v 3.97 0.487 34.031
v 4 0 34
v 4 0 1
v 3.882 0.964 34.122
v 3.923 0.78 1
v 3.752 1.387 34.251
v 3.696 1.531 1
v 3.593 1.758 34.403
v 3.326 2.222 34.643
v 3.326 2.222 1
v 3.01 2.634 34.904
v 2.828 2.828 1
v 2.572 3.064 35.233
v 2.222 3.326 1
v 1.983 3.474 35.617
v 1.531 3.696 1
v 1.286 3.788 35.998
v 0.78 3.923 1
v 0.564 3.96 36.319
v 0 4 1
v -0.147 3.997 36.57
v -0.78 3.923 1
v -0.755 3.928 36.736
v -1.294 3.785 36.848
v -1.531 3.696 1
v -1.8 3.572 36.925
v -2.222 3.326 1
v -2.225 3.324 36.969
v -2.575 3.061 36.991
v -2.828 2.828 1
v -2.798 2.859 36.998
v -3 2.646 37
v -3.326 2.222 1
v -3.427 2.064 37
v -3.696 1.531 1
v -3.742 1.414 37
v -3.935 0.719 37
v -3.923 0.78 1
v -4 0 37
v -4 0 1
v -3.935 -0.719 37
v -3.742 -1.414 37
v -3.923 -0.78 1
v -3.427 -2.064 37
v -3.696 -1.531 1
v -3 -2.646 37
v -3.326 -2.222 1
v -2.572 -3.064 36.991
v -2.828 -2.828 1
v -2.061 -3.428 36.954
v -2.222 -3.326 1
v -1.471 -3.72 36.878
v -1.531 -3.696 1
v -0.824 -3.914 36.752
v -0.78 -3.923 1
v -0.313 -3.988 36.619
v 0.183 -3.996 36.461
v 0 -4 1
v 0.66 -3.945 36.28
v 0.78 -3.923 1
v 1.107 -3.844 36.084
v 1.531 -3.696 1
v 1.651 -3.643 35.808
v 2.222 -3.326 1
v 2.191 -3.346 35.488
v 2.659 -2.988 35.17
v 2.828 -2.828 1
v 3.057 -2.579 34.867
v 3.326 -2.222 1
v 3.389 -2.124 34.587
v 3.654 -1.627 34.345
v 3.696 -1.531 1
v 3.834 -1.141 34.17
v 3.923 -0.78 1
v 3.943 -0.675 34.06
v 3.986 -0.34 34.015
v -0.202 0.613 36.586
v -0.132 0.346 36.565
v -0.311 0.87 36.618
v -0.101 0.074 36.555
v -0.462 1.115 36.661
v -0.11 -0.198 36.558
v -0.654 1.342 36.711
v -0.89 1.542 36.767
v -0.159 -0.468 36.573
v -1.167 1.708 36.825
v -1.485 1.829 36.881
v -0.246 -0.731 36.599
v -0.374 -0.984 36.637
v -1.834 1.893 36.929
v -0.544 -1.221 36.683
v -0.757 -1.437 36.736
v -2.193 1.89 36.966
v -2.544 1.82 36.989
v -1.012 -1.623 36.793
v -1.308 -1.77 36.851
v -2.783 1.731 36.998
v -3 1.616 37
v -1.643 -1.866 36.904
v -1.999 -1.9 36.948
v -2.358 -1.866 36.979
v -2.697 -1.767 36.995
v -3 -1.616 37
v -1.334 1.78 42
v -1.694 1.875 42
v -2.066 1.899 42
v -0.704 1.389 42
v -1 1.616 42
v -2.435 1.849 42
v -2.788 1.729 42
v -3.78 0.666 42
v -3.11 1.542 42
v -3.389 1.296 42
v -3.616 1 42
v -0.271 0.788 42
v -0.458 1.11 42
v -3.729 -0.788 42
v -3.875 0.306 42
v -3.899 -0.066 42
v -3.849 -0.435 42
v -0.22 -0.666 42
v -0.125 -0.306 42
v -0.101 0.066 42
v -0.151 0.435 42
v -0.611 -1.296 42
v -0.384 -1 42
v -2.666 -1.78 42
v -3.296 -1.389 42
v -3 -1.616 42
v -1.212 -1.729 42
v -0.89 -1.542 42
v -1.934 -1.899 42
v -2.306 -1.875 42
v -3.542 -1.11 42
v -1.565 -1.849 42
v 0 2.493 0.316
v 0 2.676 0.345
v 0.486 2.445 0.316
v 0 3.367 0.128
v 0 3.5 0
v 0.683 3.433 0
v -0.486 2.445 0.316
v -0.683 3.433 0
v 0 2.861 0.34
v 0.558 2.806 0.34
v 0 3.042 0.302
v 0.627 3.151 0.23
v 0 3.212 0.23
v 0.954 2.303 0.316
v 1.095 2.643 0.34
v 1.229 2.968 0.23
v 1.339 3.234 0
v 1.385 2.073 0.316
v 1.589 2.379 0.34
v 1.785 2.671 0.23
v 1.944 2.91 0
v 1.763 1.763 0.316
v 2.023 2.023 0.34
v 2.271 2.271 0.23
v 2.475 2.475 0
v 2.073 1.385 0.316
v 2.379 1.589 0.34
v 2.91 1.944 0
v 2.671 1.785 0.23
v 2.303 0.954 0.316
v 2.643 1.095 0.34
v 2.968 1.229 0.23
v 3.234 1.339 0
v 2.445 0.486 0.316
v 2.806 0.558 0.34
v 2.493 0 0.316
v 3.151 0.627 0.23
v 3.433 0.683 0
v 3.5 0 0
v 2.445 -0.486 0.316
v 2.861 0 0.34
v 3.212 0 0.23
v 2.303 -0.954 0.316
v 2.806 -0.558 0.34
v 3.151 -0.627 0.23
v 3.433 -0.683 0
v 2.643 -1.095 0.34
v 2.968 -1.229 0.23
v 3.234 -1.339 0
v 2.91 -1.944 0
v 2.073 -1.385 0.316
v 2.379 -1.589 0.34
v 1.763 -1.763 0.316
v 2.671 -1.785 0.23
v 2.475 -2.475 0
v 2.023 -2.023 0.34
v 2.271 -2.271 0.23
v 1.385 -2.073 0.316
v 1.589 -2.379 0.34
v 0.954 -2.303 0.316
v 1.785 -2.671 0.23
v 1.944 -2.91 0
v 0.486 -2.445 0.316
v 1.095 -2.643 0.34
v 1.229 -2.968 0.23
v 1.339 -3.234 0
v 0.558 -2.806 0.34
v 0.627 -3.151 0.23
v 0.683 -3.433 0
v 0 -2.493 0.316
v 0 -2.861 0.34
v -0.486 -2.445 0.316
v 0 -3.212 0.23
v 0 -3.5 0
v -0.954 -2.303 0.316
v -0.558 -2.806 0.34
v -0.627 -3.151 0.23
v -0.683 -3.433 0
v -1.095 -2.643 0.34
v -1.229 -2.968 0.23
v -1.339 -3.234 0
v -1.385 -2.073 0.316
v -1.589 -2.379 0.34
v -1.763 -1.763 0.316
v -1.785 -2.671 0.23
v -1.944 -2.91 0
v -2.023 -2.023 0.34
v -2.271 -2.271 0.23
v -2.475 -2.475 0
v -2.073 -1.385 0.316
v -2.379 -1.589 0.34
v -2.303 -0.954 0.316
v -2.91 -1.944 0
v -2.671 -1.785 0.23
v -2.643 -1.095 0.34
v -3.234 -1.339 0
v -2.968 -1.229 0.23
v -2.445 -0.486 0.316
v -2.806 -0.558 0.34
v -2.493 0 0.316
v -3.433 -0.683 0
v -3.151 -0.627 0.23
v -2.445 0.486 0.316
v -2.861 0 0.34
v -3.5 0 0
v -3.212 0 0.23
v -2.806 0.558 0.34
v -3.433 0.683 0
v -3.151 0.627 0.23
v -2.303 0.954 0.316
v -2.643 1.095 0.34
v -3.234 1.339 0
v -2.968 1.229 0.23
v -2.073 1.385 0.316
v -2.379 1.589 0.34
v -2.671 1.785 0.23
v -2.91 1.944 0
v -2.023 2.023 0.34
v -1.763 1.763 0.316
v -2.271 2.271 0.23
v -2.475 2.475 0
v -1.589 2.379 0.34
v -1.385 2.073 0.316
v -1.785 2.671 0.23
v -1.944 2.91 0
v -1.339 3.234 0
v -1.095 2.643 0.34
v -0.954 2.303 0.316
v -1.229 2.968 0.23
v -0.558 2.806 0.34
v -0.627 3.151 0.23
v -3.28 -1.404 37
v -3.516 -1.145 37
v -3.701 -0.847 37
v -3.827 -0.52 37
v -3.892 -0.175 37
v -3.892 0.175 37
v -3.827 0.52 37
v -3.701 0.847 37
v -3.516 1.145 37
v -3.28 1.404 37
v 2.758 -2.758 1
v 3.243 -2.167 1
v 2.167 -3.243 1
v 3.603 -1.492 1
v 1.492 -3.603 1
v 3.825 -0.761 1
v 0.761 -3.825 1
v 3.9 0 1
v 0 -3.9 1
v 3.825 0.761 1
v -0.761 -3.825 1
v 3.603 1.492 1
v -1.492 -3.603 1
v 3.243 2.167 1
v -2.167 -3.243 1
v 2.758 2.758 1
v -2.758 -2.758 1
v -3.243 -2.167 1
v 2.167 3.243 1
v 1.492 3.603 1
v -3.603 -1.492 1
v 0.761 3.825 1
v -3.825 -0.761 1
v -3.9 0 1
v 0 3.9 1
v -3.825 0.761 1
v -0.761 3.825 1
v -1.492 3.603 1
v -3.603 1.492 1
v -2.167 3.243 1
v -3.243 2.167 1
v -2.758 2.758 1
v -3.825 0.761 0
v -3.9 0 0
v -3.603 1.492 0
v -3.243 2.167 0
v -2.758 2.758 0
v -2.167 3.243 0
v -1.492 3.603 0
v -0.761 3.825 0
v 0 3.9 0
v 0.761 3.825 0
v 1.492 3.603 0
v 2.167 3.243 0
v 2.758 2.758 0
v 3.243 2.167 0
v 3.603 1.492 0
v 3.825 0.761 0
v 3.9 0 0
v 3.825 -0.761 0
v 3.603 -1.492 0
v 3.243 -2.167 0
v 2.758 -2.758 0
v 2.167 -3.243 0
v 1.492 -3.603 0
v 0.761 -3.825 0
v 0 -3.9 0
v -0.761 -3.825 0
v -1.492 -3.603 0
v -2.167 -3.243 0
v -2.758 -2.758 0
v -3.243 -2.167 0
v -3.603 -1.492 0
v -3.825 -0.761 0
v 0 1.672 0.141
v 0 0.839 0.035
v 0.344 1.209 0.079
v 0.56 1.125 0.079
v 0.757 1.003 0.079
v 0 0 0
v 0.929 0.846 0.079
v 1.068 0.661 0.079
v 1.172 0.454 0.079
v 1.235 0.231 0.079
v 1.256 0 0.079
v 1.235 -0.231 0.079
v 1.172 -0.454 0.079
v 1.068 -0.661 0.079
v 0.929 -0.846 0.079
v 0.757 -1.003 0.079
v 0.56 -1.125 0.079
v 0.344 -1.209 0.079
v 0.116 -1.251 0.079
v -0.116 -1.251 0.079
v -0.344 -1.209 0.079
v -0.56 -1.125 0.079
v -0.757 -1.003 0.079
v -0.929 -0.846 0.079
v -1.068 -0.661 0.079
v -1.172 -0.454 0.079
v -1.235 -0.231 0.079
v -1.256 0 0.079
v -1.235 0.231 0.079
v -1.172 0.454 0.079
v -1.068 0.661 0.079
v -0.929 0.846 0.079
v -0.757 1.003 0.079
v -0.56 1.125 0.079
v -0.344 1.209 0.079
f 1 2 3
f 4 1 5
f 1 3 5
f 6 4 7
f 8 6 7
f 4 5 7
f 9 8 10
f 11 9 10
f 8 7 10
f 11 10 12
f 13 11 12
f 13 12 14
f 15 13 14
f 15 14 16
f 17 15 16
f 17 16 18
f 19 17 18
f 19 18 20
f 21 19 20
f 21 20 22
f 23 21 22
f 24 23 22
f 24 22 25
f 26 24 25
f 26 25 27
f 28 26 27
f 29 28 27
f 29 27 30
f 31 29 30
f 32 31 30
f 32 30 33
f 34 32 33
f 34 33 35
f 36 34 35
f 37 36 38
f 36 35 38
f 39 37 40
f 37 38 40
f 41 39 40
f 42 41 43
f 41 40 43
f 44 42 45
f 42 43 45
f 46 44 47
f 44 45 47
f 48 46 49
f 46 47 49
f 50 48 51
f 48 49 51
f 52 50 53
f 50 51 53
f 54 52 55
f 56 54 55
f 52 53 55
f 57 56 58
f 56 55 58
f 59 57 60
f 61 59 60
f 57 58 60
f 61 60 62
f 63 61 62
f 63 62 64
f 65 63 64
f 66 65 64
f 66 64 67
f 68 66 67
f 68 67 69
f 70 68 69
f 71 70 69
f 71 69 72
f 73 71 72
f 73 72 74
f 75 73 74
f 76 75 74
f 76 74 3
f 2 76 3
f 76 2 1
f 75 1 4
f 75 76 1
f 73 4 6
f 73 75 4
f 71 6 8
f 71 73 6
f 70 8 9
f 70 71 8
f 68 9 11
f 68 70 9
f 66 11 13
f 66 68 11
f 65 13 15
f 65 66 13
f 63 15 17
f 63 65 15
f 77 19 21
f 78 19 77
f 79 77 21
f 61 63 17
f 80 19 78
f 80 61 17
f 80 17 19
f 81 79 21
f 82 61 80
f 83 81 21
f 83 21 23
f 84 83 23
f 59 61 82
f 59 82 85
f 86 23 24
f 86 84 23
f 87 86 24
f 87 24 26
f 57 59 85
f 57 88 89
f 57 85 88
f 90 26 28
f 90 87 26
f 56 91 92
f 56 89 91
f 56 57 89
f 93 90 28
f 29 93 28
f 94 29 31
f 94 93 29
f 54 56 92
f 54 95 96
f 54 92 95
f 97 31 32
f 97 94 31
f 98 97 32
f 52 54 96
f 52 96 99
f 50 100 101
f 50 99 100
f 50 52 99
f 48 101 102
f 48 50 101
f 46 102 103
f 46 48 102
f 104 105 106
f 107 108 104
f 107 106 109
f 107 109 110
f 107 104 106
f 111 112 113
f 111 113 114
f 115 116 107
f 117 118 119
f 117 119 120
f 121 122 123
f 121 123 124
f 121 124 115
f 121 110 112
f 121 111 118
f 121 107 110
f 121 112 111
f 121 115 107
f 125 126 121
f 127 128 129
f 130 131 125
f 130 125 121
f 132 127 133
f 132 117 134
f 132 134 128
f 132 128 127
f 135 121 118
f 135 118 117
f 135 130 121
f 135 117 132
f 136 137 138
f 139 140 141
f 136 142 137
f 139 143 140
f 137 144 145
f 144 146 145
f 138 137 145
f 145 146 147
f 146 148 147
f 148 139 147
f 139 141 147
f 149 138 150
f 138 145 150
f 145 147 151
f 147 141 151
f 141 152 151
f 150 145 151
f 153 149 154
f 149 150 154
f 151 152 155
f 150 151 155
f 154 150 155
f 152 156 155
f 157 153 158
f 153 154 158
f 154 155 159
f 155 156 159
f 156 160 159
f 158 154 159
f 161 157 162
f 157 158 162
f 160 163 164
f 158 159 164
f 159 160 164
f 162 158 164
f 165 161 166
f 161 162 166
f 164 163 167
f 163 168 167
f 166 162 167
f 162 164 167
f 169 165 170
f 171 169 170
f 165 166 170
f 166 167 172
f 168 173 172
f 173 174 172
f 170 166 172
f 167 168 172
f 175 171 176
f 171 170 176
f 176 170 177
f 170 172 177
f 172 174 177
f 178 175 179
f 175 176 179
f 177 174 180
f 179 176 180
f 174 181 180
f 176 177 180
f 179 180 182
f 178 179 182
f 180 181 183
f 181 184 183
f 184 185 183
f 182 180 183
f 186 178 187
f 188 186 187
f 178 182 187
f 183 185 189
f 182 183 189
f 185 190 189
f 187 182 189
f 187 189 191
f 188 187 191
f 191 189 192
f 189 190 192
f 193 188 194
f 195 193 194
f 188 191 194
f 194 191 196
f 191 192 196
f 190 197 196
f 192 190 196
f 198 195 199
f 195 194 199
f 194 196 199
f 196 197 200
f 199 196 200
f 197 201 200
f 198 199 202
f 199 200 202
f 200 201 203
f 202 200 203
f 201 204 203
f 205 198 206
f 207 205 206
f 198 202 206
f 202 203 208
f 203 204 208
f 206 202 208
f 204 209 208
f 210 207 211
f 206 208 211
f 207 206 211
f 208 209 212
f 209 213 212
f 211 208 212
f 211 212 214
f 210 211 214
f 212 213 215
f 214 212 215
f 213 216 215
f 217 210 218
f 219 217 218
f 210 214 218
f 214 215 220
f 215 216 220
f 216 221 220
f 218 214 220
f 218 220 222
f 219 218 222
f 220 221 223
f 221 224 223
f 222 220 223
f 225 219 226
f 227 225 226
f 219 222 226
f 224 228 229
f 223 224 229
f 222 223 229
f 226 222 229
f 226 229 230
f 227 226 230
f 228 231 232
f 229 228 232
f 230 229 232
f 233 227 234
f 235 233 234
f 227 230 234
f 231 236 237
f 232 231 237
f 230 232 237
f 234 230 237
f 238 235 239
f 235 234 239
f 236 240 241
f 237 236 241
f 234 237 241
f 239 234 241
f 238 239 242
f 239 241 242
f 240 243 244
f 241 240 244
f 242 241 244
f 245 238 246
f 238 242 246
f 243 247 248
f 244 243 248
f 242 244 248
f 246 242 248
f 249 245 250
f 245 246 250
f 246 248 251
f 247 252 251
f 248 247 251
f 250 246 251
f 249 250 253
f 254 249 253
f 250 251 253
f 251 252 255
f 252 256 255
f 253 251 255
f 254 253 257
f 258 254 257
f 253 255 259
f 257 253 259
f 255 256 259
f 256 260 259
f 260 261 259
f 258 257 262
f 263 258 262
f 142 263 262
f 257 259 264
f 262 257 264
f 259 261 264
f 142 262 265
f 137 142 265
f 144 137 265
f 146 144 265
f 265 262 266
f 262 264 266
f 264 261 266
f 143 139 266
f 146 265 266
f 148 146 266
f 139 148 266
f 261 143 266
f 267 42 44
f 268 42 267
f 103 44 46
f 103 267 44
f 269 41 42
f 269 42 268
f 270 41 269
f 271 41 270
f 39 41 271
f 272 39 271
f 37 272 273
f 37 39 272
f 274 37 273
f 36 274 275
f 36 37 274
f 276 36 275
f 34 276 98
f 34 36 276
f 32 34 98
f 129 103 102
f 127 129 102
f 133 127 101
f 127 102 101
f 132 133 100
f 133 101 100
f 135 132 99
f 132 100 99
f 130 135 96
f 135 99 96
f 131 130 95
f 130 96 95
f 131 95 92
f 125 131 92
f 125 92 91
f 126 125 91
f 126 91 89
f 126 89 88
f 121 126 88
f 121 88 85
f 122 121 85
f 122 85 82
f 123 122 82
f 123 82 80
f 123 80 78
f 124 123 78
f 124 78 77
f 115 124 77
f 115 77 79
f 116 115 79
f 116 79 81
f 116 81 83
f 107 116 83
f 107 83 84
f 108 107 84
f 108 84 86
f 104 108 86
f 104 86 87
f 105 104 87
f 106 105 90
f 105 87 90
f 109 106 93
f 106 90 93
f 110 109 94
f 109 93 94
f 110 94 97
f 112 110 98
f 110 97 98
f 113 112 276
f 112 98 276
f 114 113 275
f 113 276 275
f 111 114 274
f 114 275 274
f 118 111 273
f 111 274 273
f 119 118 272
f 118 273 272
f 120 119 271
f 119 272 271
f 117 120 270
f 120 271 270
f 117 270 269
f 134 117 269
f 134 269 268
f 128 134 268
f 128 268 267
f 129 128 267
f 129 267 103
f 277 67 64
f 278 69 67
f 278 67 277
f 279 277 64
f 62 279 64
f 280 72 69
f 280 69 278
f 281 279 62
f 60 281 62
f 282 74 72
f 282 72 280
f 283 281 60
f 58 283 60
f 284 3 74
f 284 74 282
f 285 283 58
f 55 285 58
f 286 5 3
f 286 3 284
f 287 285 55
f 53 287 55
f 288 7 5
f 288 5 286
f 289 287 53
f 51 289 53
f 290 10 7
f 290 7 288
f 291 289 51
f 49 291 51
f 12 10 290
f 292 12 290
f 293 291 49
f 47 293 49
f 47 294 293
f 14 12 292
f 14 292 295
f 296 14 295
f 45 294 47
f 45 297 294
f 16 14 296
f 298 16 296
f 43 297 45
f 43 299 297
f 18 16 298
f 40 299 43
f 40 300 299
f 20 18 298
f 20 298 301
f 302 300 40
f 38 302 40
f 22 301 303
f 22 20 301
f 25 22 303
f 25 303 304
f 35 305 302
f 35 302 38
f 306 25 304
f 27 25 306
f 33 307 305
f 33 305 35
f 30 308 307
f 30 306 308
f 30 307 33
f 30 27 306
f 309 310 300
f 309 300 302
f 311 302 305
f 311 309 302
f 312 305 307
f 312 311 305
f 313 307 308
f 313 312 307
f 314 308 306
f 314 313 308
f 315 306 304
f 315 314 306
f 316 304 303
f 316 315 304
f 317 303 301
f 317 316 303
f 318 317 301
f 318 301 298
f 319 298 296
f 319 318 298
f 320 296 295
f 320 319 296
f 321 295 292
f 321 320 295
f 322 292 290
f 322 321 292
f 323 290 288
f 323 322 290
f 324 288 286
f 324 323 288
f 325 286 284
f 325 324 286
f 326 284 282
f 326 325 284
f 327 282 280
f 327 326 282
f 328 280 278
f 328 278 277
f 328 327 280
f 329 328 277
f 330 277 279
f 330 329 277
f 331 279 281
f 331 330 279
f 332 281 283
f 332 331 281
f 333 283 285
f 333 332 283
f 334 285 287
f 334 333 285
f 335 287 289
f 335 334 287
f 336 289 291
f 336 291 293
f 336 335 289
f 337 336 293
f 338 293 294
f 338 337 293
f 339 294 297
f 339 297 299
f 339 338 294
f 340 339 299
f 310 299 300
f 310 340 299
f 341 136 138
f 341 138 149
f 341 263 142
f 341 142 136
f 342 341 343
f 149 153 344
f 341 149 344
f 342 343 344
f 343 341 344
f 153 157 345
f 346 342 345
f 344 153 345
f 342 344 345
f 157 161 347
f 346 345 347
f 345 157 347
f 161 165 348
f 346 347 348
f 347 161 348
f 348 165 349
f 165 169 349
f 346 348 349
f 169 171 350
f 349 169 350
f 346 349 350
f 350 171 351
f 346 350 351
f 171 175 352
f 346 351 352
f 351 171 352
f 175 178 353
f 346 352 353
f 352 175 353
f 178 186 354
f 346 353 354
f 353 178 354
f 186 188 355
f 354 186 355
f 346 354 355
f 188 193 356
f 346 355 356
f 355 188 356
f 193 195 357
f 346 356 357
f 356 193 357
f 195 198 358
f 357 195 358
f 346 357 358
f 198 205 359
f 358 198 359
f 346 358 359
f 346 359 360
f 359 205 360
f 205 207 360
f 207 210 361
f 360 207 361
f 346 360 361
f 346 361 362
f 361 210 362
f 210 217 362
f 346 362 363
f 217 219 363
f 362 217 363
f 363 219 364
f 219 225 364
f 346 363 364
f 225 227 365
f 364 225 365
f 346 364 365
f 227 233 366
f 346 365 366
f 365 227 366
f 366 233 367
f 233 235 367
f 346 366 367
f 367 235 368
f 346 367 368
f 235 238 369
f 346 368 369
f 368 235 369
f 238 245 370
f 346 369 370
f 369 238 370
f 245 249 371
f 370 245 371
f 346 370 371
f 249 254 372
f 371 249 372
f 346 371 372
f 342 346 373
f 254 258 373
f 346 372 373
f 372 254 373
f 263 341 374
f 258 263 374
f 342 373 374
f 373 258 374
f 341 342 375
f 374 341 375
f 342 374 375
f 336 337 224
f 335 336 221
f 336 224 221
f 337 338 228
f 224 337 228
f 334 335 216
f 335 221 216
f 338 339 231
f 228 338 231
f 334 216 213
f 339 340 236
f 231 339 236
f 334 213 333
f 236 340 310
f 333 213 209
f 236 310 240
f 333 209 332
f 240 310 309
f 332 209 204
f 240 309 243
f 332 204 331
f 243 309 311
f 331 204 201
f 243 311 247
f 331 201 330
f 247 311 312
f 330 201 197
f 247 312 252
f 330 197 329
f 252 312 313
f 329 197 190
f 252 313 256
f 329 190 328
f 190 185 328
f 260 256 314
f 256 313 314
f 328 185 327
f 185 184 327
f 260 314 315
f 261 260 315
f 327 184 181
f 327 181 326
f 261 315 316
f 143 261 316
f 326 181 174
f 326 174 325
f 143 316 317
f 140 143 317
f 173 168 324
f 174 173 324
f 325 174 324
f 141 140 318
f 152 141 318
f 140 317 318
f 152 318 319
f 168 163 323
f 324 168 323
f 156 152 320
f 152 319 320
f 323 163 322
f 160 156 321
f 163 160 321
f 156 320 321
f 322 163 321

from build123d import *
from build123d.topology import SkipClean

# Parameters (mm, degrees)
SKETCH_1_R                  = 4
EXTRUDE_1_DEPTH             = 37
SKETCH_2_R                  = 4
SKETCH_2_R_2                = 3.9
CUT_EXTRUDE_1_DEPTH         = 1
CUT_EXTRUDE_2_DEPTH         = 38.429934544
CUT_EXTRUDE_2_DEPTH_BACK    = 38.429934544
EXTRUDE_2_REACH             = 39.43
SKETCH_4_R                  = 1.9
EXTRUDE_2_DIRECTION_2_DEPTH = 5


with BuildPart() as part:
    # 草图1 → 凸台-拉伸1 (new body)
    with BuildSketch(Plane.XY):
        Circle(SKETCH_1_R)
    extrude(amount=EXTRUDE_1_DEPTH)

    # 草图2 → 切除-拉伸1 (cut)
    with BuildSketch(Plane(origin=(0, 0, 0), x_dir=(-1, 0, 0), z_dir=(0, 0, -1))):
        Circle(SKETCH_2_R)
        Circle(SKETCH_2_R_2, mode=Mode.SUBTRACT)
    extrude(amount=-CUT_EXTRUDE_1_DEPTH, mode=Mode.SUBTRACT)

    # 草图3 → 切除-拉伸2 (cut, two sides: drawn at the far end of the back side and taken through both)
    with BuildSketch(Plane(origin=(0, 0, 0), x_dir=(1, 0, 0), z_dir=(0, 1, 0)).offset(-CUT_EXTRUDE_2_DEPTH_BACK)):
        with BuildLine():
            Line((-3, -37), (4, -37))
            Line((4, -37), (4, -34))
            ThreePointArc((4, -34), (0.807886553, -36.218401957), (-3, -37))
        make_face()
    extrude(amount=CUT_EXTRUDE_2_DEPTH + CUT_EXTRUDE_2_DEPTH_BACK, mode=Mode.SUBTRACT)

    # 草图4 → 凸台-拉伸2 (add, up to next)
    with BuildSketch(Plane.XY.offset(37), mode=Mode.PRIVATE) as extrude_2_sk1:
        with Locations((-2, 0)):
            Circle(SKETCH_4_R)
    extrude_2_tool1 = extrude(extrude_2_sk1.sketch, amount=-EXTRUDE_2_REACH, mode=Mode.PRIVATE) - part.part
    add(extrude_2_tool1.solids().sort_by_distance((-2, 0, 37))[0])

    # 草图4 → 凸台-拉伸2 direction 2 (add)
    with SkipClean():  # the faces are left unmerged after this step: merging them gives an invalid solid
        with BuildSketch(Plane.XY.offset(37)):
            with Locations((-2, 0)):
                Circle(SKETCH_4_R)
        extrude(amount=EXTRUDE_2_DIRECTION_2_DEPTH)
    add(part.part.scale(1), mode=Mode.REPLACE)  # the faces are merged on a copy

    # 草图5 → 切除-旋转3 (revolve, cut)
    with BuildSketch(Plane(origin=(0, 0, 0), x_dir=(0, 0, -1), z_dir=(1, 0, 0))):
        with BuildLine():
            Line((0, 3.5), (0.5, 3.5))
            Line((0.5, 3.5), (0.5, 0))
            Line((0.5, 0), (0, 0))
            ThreePointArc((0, 0), (-0.079251839, 1.256485548), (-0.315751187, 2.493055338))
            ThreePointArc((-0.315751187, 2.493055338), (-0.301514199, 3.041568933), (0, 3.5))
        make_face()
    revolve(axis=Axis((0, 0, 10), (0, 0, -1)), mode=Mode.SUBTRACT)


solid = part.part
